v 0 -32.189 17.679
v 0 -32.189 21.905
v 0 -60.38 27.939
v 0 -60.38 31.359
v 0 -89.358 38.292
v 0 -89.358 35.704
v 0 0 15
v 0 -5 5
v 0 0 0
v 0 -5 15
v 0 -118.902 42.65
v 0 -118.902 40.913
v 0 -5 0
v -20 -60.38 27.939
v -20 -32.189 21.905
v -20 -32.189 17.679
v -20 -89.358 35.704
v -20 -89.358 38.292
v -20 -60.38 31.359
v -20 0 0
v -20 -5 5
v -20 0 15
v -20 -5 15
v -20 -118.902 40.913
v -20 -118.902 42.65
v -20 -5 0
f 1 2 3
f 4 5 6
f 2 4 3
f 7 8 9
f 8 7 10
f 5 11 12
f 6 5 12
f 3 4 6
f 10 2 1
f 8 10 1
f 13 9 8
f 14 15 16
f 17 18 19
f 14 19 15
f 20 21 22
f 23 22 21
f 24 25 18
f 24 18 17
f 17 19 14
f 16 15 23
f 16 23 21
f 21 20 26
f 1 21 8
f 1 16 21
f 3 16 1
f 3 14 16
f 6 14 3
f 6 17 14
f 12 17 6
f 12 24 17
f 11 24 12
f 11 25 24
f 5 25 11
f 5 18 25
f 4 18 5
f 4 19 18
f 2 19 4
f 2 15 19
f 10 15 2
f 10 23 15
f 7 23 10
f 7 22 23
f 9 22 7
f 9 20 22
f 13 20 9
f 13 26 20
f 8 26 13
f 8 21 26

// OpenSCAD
// size of the base of the diving board
base_width = 5;
base_height = 15;

segment_height = 10;
segment_width = 30;

angles = [ 25, 20, 15, 10 ];

// first points to hit. runs across the base and up to where the first segment
// will start
initial_p = [
    [ 0, 0 ],
    [ base_width, 0 ],
    [ base_width, base_height - segment_height ]
];

// last points to travel to.
end_p = [
    [ base_width, base_height ],
    [ 0, base_height ]
];

// counters to make list comprhensions easier.
count = len(angles) - 1;
iters = [ 0 : count ];

// recursively accumulates values in a list. we need this since openscad won't
// let us append to array.
function accum(i, list) = i < 1 ?  list[0] : list[i] + accum(i - 1, list); 

// for each angle, calculate delta z. then accumulate. then add in init heigh.
z_deltas = [ for (theta = angles) segment_width * sin(theta) ];
z_delta_accum = [ for(i = iters) accum(i, z_deltas) ];
thicknesses = [ for (theta = angles) segment_height * cos(90 - theta) ];

bottom_z = [ for (z = z_delta_accum) z + base_height - segment_height ];
top_z = [ for (i = iters) bottom_z[i] + thicknesses[i] ];

// do the same for the x direction.
x_deltas = [ for (theta = angles) segment_width * cos(theta) ];
x_delta_accum = [ for (i = iters) accum(i, x_deltas) ];
x = [ for (x = x_delta_accum) x + base_width ];

bottom_p = [ for (i = iters) [ x[i], bottom_z[i] ] ];
top_p = [ for (i = iters) [ x[count - i], top_z[count - i] ] ];

points = concat(initial_p, bottom_p, top_p, end_p);

// translate([0, -85, 0])
// cube([10, 170, 10], true);

rotate([90, 0, -90])             // rotate the diving board to extrude over x-y
linear_extrude(height=20)     // linearly extrude the 2d diving board
polygon(points=points);       // create a 2d diving board from points
